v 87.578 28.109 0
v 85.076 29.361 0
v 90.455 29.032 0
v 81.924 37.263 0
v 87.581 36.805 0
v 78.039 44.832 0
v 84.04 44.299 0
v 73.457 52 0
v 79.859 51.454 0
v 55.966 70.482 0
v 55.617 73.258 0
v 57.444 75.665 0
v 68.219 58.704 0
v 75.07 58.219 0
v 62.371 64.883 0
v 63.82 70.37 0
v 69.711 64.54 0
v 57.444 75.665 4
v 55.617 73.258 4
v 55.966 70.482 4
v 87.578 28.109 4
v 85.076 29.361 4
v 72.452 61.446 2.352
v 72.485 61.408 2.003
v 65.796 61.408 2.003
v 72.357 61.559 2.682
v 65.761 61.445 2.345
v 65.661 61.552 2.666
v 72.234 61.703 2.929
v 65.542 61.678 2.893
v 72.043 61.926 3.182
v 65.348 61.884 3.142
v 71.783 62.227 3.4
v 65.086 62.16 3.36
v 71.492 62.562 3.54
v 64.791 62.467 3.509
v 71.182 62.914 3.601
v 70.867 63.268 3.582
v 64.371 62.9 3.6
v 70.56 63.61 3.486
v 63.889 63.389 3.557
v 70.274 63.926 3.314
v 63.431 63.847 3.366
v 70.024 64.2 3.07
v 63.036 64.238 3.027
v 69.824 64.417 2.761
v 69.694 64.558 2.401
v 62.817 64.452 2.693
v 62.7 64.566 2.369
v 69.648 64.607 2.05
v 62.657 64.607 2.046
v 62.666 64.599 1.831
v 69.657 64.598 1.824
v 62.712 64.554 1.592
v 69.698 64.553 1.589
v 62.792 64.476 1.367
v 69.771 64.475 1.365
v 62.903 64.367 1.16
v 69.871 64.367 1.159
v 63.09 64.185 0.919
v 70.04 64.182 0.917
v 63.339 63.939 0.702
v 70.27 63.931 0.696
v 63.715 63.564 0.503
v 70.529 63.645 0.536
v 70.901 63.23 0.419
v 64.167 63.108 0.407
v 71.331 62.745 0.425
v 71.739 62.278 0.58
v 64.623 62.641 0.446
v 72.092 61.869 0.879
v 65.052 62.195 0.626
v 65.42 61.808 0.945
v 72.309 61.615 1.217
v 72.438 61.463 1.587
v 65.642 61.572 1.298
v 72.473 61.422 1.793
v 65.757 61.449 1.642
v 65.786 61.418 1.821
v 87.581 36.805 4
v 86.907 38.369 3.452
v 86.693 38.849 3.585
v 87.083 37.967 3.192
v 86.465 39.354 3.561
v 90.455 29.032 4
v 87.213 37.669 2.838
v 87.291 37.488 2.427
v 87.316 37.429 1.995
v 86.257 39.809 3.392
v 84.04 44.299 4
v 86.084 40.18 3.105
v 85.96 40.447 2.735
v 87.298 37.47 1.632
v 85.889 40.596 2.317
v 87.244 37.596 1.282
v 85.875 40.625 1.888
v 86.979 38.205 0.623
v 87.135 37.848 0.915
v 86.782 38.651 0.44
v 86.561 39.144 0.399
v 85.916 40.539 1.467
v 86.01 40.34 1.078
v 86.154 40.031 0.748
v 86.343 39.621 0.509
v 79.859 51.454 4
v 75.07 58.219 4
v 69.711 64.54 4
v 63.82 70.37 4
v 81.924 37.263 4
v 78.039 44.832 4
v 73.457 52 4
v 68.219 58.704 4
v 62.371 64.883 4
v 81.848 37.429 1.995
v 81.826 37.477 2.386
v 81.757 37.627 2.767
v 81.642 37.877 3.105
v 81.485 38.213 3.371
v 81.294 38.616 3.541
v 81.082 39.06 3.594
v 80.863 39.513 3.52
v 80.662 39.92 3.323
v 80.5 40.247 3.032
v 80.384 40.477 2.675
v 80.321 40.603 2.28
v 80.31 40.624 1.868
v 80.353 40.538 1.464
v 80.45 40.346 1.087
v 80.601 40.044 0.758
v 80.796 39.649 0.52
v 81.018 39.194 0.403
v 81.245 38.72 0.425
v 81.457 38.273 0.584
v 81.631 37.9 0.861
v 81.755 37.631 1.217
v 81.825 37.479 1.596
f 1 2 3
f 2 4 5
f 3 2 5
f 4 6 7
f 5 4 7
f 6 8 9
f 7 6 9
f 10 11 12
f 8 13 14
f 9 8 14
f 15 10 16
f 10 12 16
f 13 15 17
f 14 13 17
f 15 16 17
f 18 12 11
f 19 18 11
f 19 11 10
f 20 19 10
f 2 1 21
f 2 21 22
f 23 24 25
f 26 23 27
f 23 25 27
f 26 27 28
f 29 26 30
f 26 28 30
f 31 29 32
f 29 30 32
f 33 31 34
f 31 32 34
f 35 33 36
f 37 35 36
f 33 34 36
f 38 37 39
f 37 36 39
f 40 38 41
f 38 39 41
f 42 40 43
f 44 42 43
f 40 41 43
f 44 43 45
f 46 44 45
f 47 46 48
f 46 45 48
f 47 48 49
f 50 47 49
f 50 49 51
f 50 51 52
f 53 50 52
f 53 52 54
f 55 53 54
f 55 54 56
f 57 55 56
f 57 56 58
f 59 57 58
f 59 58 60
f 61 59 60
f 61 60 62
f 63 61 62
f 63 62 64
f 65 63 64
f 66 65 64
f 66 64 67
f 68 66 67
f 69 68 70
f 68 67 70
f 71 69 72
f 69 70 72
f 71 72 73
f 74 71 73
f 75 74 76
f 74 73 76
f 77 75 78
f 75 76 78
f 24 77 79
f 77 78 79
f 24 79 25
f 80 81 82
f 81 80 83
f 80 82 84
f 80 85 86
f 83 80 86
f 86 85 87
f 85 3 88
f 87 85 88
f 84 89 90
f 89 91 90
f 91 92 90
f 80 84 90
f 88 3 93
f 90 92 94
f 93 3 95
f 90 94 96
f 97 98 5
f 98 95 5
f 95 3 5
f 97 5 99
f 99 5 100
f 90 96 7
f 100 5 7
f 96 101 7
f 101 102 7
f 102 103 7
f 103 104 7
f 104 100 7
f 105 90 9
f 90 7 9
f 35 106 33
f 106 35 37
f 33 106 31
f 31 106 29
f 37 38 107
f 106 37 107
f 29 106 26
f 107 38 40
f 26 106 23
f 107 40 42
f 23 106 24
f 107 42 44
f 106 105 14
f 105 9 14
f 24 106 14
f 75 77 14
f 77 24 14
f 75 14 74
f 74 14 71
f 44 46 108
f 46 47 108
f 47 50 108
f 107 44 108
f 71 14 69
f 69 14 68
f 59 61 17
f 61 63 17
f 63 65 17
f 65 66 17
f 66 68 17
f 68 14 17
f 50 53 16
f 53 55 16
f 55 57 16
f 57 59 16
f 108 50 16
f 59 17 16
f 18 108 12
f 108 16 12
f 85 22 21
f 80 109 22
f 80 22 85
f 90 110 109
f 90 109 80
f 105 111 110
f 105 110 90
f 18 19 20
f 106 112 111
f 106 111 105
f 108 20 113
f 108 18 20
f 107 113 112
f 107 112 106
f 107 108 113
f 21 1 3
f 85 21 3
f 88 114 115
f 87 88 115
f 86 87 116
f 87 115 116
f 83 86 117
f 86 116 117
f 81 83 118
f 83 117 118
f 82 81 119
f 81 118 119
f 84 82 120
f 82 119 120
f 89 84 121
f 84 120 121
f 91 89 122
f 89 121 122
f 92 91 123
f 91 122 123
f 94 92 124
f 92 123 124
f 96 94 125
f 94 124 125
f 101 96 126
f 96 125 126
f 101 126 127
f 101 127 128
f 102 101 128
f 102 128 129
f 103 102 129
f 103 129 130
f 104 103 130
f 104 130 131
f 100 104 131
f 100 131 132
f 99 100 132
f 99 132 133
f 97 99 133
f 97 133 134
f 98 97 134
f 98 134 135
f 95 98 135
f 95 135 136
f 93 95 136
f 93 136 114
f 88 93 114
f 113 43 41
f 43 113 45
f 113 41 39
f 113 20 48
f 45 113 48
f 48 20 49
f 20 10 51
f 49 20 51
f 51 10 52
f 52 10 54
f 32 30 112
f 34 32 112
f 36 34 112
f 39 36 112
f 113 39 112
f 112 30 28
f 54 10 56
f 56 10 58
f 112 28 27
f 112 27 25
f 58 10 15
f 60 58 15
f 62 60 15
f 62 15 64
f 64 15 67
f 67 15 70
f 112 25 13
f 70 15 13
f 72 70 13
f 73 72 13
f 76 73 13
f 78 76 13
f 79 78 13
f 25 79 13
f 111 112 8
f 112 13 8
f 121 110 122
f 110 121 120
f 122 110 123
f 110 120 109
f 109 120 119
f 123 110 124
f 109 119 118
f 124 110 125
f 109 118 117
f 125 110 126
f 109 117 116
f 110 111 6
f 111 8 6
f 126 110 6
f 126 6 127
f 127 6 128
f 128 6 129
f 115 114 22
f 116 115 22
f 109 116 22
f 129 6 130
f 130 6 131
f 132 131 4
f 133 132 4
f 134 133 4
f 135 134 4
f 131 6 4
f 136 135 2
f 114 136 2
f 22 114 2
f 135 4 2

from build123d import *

# Parameters (mm, degrees)
F1_DEPTH    = 4
F4_D        = 3.2
F5_T1_DEPTH = 14.1810362517


# Not quite as in the source:
# - a fillet or chamfer that OpenCascade refuses, or shapes differently, is made with other operations: its cross-section is extruded or revolved along the edge and cut away or added


with BuildPart() as f1:
    # F0 (on Top) → F1 (new body)
    with BuildSketch(Plane.XY):
        with BuildLine():
            ThreePointArc((54.4209333808, 71.682368892), (73.4574706888, 52), (85.6943365292, 27.5041939859))
            Line((85.6943365292, 27.5041939859), (90.4551330031, 29.0322047629))
            ThreePointArc((90.4551330031, 29.0322047629), (77.5384412827, 54.8888888889), (57.4443185686, 75.6647227193))
            Line((57.4443185686, 75.6647227193), (54.4209333808, 71.682368892))
        make_face()
    extrude(amount=F1_DEPTH)

    # F4 (through all)
    with Locations(Plane.YZ.offset(90.457)):
        with Locations((39.0287227929, 1.9947474357), (63.0079358816, 2.0034648478)):
            Hole(F4_D / 2)

    # F5: chamfer of 2 on 2 edges, made by hand

    # F5_s2 → F5_t1 (cut)
    with BuildSketch(Plane.XY.offset(-5.0905181258)):
        with BuildLine():
            Line((87.5779535576, 28.1087539864), (85.0761677414, 29.3606144765))
            ThreePointArc((85.0761677414, 29.3606144765), (85.3813536757, 28.4609283843), (85.6943365292, 27.5041939859))
            Line((85.6943365292, 27.5041939859), (87.5779535576, 28.1087539864))
        make_face()
        with BuildLine():
            Line((55.6171407495, 73.2579937949), (55.9663848396, 70.4823649432))
            ThreePointArc((55.9663848396, 70.4823649432), (55.2192662472, 71.0692101766), (54.4209333808, 71.682368892))
            Line((54.4209333808, 71.682368892), (55.6171407495, 73.2579937949))
        make_face()
    extrude(amount=F5_T1_DEPTH, mode=Mode.SUBTRACT)


solid = f1.part
